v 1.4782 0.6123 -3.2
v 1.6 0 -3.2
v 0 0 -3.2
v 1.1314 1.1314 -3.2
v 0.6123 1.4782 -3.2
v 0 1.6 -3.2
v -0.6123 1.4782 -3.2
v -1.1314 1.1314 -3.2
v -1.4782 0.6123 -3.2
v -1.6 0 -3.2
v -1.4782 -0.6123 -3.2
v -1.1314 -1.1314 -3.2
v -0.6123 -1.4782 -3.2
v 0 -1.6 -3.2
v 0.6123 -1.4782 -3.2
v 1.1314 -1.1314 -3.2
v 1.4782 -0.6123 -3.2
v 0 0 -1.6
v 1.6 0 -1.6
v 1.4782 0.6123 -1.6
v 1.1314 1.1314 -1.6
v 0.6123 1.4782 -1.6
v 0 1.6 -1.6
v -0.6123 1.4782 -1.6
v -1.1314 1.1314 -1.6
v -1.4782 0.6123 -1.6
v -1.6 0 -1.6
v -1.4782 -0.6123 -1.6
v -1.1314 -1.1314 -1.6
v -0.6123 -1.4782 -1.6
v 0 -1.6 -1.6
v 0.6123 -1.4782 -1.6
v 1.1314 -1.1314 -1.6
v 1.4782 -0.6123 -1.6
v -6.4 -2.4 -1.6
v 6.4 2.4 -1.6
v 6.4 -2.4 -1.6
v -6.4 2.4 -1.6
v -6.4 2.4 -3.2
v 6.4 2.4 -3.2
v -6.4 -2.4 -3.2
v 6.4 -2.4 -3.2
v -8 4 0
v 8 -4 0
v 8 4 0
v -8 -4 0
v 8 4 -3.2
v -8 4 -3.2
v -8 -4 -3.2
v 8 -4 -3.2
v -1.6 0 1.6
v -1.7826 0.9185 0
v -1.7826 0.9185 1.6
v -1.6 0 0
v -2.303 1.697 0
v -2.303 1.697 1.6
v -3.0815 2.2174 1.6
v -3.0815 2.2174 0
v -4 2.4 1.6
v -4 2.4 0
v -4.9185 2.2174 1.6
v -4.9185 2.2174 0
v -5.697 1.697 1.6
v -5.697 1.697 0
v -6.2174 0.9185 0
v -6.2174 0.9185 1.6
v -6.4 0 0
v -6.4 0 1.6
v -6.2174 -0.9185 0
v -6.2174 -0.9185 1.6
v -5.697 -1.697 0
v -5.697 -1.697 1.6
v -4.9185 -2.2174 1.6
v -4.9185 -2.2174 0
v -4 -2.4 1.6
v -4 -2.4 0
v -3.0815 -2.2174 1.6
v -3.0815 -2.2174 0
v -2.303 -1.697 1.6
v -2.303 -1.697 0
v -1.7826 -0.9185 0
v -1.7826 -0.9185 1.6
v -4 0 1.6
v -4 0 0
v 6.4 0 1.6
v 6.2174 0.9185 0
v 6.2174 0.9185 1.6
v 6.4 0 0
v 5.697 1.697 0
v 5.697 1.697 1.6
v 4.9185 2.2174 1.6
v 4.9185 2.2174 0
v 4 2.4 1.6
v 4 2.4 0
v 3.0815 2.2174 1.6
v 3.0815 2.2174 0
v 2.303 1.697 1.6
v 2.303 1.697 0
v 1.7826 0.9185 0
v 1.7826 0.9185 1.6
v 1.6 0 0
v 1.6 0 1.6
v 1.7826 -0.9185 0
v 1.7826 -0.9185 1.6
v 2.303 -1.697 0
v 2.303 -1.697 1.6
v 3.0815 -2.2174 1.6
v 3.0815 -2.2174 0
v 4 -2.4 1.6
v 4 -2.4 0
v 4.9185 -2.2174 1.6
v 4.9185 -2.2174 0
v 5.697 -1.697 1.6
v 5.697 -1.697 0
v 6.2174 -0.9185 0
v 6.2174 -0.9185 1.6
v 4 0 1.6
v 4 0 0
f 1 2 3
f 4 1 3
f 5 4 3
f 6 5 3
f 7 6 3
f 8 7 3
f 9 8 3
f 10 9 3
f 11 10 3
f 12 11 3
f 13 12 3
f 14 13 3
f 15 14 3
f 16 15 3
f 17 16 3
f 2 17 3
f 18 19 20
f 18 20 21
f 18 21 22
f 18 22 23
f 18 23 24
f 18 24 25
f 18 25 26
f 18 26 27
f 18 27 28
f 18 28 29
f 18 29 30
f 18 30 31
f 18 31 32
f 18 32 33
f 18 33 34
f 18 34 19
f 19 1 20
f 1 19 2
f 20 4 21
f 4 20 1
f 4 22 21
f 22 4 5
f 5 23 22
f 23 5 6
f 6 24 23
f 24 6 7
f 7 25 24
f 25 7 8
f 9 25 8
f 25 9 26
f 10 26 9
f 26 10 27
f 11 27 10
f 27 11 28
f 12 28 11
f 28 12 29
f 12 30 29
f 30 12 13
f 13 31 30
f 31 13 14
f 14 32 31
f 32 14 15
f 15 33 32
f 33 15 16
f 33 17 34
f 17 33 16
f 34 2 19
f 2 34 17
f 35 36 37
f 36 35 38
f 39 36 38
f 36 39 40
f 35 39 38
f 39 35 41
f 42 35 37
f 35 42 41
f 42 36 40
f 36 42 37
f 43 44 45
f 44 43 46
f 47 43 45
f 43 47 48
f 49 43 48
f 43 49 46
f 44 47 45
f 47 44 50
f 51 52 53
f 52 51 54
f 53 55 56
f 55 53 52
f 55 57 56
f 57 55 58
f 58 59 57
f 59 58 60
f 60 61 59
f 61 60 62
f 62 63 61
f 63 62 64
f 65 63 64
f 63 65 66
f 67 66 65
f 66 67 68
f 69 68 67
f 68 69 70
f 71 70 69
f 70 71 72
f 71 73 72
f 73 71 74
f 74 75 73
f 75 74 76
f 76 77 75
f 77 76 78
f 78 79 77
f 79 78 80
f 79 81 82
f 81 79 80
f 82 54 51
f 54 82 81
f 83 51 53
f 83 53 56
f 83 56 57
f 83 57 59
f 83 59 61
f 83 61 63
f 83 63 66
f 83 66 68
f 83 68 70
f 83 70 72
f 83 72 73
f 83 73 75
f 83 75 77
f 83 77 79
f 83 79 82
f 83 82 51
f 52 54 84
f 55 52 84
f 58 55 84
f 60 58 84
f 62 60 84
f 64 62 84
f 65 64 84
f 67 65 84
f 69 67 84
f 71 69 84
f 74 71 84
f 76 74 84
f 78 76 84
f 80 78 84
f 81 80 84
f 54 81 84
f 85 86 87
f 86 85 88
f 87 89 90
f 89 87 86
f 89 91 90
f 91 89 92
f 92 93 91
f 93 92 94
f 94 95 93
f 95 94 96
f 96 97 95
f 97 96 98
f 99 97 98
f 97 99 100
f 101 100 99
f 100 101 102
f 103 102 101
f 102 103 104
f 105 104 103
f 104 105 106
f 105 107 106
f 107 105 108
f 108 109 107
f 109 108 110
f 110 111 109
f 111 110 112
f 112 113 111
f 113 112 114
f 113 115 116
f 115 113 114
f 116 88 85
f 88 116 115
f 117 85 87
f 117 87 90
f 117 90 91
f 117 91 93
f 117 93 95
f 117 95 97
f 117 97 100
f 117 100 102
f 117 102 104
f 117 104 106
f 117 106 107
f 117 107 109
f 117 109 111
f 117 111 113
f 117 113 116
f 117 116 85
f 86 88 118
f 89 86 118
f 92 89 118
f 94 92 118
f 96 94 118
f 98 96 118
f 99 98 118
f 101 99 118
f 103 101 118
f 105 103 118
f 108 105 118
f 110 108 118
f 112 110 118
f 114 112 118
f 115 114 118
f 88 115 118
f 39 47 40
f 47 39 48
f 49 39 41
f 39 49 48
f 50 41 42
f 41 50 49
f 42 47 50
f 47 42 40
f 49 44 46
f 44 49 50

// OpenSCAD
// file: ../p/stud.scad
use <../lib.scad>
use <4-4cyli.scad>
use <4-4disc.scad>
use <4-4edge.scad>
function ldraw_lib__stud() = [
// 0 Stud
// 0 Name: stud.dat
// 0 Author: James Jessiman
// 0 !LDRAW_ORG Primitive UPDATE 2012-01
// 0 !LICENSE Licensed under CC BY 4.0 : see CAreadme.txt
// 
// 0 BFC CERTIFY CCW
  [0,"BFC","CERTIFY"],
  [0,"BFC","CCW"],
// 
// 0 !HISTORY 2002-04-04 [sbliss] Modified for BFC compliance
// 0 !HISTORY 2002-04-25 [PTadmin] Official Update 2002-02
// 0 !HISTORY 2007-06-24 [PTadmin] Header formatted for Contributor Agreement
// 0 !HISTORY 2008-07-01 [PTadmin] Official Update 2008-01
// 0 !HISTORY 2012-02-16 [Philo] Changed to CCW
// 0 !HISTORY 2012-03-30 [PTadmin] Official Update 2012-01
// 
// 
// 1 16 0 0 0 6 0 0 0 1 0 0 0 6 4-4edge.dat
  [1,16,0,0,0,6,0,0,0,1,0,0,0,6, ldraw_lib__4_4edge()],
// 1 16 0 -4 0 6 0 0 0 1 0 0 0 6 4-4edge.dat
  [1,16,0,-4,0,6,0,0,0,1,0,0,0,6, ldraw_lib__4_4edge()],
// 1 16 0 0 0 6 0 0 0 -4 0 0 0 6 4-4cyli.dat
  [1,16,0,0,0,6,0,0,0,-4,0,0,0,6, ldraw_lib__4_4cyli()],
// 1 16 0 -4 0 6 0 0 0 1 0 0 0 6 4-4disc.dat
  [1,16,0,-4,0,6,0,0,0,1,0,0,0,6, ldraw_lib__4_4disc()],
  [-1,16,0,0,0,6,0,0,0,-1,0,0,0,6, ldraw_lib__4_4disc()],
];
module ldraw_lib__stud(step=0, col=false, unit=2/5, alt=false, line=0.2, solid=!$preview)
    makepoly(ldraw_lib__stud(), step=step, col=col, unit=unit, alt=alt, line=line, solid=solid);
ldraw_lib__stud(line=0.2);
// file: ../p/4-4edge.scad
use <../lib.scad>
function ldraw_lib__4_4edge() = [
// 0 Circle 1.0
// 0 Name: 4-4edge.dat
// 0 Author: James Jessiman
// 0 !LDRAW_ORG Primitive UPDATE 2017-01
// 0 !LICENSE Licensed under CC BY 2.0 and CC BY 4.0 : see CAreadme.txt
// 
// 0 BFC CERTIFY CCW
  [0,"BFC","CERTIFY"],
  [0,"BFC","CCW"],
// 
// 0 !HISTORY 1998-12-15 [PTadmin] Official Update 1998-10
// 0 !HISTORY 2005-12-28 [PTadmin] Official Update 2005-01
// 0 !HISTORY 2007-06-24 [PTadmin] Header formatted for Contributor Agreement
// 0 !HISTORY 2008-07-01 [PTadmin] Official Update 2008-01
// 0 !HISTORY 2017-01-15 [Steffen] BFCed
// 0 !HISTORY 2017-12-30 [PTadmin] Official Update 2017-01
// 
// 
// 2 24 1 0 0 0.9239 0 0.3827
  [2,24,1,0,0,0.9239,0,0.3827],
// 2 24 0.9239 0 0.3827 0.7071 0 0.7071
  [2,24,0.9239,0,0.3827,0.7071,0,0.7071],
// 2 24 0.7071 0 0.7071 0.3827 0 0.9239
  [2,24,0.7071,0,0.7071,0.3827,0,0.9239],
// 2 24 0.3827 0 0.9239 0 0 1
  [2,24,0.3827,0,0.9239,0,0,1],
// 2 24 0 0 1 -0.3827 0 0.9239
  [2,24,0,0,1,-0.3827,0,0.9239],
// 2 24 -0.3827 0 0.9239 -0.7071 0 0.7071
  [2,24,-0.3827,0,0.9239,-0.7071,0,0.7071],
// 2 24 -0.7071 0 0.7071 -0.9239 0 0.3827
  [2,24,-0.7071,0,0.7071,-0.9239,0,0.3827],
// 2 24 -0.9239 0 0.3827 -1 0 -0
  [2,24,-0.9239,0,0.3827,-1,0,-0],
// 2 24 -1 0 -0 -0.9239 0 -0.3827
  [2,24,-1,0,-0,-0.9239,0,-0.3827],
// 2 24 -0.9239 0 -0.3827 -0.7071 0 -0.7071
  [2,24,-0.9239,0,-0.3827,-0.7071,0,-0.7071],
// 2 24 -0.7071 0 -0.7071 -0.3827 0 -0.9239
  [2,24,-0.7071,0,-0.7071,-0.3827,0,-0.9239],
// 2 24 -0.3827 0 -0.9239 0 0 -1
  [2,24,-0.3827,0,-0.9239,0,0,-1],
// 2 24 0 0 -1 0.3827 0 -0.9239
  [2,24,0,0,-1,0.3827,0,-0.9239],
// 2 24 0.3827 0 -0.9239 0.7071 0 -0.7071
  [2,24,0.3827,0,-0.9239,0.7071,0,-0.7071],
// 2 24 0.7071 0 -0.7071 0.9239 0 -0.3827
  [2,24,0.7071,0,-0.7071,0.9239,0,-0.3827],
// 2 24 0.9239 0 -0.3827 1 0 0
  [2,24,0.9239,0,-0.3827,1,0,0],
];
module ldraw_lib__4_4edge(step=0, col=false, unit=2/5, alt=false, line=0.2, solid=!$preview)
    makepoly(ldraw_lib__4_4edge(), step=step, col=col, unit=unit, alt=alt, line=line, solid=solid);
ldraw_lib__4_4edge(line=0.2);
// file: ../p/4-4disc.scad
use <../lib.scad>
function ldraw_lib__4_4disc() = [
// 0 Disc 1.0
// 0 Name: 4-4disc.dat
// 0 Author: James Jessiman
// 0 !LDRAW_ORG Primitive UPDATE 2002-02
// 0 !LICENSE Licensed under CC BY 2.0 and CC BY 4.0 : see CAreadme.txt
// 
// 0 BFC CERTIFY CCW
  [0,"BFC","CERTIFY"],
  [0,"BFC","CCW"],
// 
// 0 !HISTORY 1998-12-15 [PTadmin] Official Update 1998-10
// 0 !HISTORY 2002-03-23 [sbliss] Added BFC statement
// 0 !HISTORY 2002-04-25 [PTadmin] Official Update 2002-02
// 0 !HISTORY 2007-06-24 [PTadmin] Header formatted for Contributor Agreement
// 0 !HISTORY 2008-07-01 [PTadmin] Official Update 2008-01
// 
// 
// 3 16 0 0 0 1 0 0 0.9239 0 0.3827
  [3,16,0,0,0,1,0,0,0.9239,0,0.3827],
// 3 16 0 0 0 0.9239 0 0.3827 0.7071 0 0.7071
  [3,16,0,0,0,0.9239,0,0.3827,0.7071,0,0.7071],
// 3 16 0 0 0 0.7071 0 0.7071 0.3827 0 0.9239
  [3,16,0,0,0,0.7071,0,0.7071,0.3827,0,0.9239],
// 3 16 0 0 0 0.3827 0 0.9239 0 0 1
  [3,16,0,0,0,0.3827,0,0.9239,0,0,1],
// 3 16 0 0 0 0 0 1 -0.3827 0 0.9239
  [3,16,0,0,0,0,0,1,-0.3827,0,0.9239],
// 3 16 0 0 0 -0.3827 0 0.9239 -0.7071 0 0.7071
  [3,16,0,0,0,-0.3827,0,0.9239,-0.7071,0,0.7071],
// 3 16 0 0 0 -0.7071 0 0.7071 -0.9239 0 0.3827
  [3,16,0,0,0,-0.7071,0,0.7071,-0.9239,0,0.3827],
// 3 16 0 0 0 -0.9239 0 0.3827 -1 0 -0
  [3,16,0,0,0,-0.9239,0,0.3827,-1,0,-0],
// 3 16 0 0 0 -1 0 -0 -0.9239 0 -0.3827
  [3,16,0,0,0,-1,0,-0,-0.9239,0,-0.3827],
// 3 16 0 0 0 -0.9239 0 -0.3827 -0.7071 0 -0.7071
  [3,16,0,0,0,-0.9239,0,-0.3827,-0.7071,0,-0.7071],
// 3 16 0 0 0 -0.7071 0 -0.7071 -0.3827 0 -0.9239
  [3,16,0,0,0,-0.7071,0,-0.7071,-0.3827,0,-0.9239],
// 3 16 0 0 0 -0.3827 0 -0.9239 0 0 -1
  [3,16,0,0,0,-0.3827,0,-0.9239,0,0,-1],
// 3 16 0 0 0 0 0 -1 0.3827 0 -0.9239
  [3,16,0,0,0,0,0,-1,0.3827,0,-0.9239],
// 3 16 0 0 0 0.3827 0 -0.9239 0.7071 0 -0.7071
  [3,16,0,0,0,0.3827,0,-0.9239,0.7071,0,-0.7071],
// 3 16 0 0 0 0.7071 0 -0.7071 0.9239 0 -0.3827
  [3,16,0,0,0,0.7071,0,-0.7071,0.9239,0,-0.3827],
// 3 16 0 0 0 0.9239 0 -0.3827 1 0 0
  [3,16,0,0,0,0.9239,0,-0.3827,1,0,0],
// 0
];
module ldraw_lib__4_4disc(step=0, col=false, unit=2/5, alt=false, line=0.2, solid=!$preview)
    makepoly(ldraw_lib__4_4disc(), step=step, col=col, unit=unit, alt=alt, line=line, solid=solid);
ldraw_lib__4_4disc(line=0.2);
// file: ../p/4-4cyli.scad
use <../lib.scad>
$fa=1; $fs=0.2;
function ldraw_lib__4_4cyli(realsolid=false) = [
// 0 Cylinder 1.0
// 0 Name: 4-4cyli.dat
// 0 Author: James Jessiman
// 0 !LDRAW_ORG Primitive UPDATE 2005-01
// 0 !LICENSE Licensed under CC BY 2.0 and CC BY 4.0 : see CAreadme.txt
// 
// 0 BFC CERTIFY CCW
  [0,"BFC","CERTIFY"],
  [0,"BFC","CCW"],
// 
// 0 !HISTORY 1998-12-15 [PTadmin] Official Update 1998-10
// 0 !HISTORY 2002-03-23 [sbliss] Added BFC statement; merged headers from files in distributions LDraw 0.27 and Complete.
// 0 !HISTORY 2002-04-25 [PTadmin] Official Update 2002-02
// 0 !HISTORY 2004-12-14 [guyvivan] BFC CCW
// 0 !HISTORY 2005-12-28 [PTadmin] Official Update 2005-01
// 0 !HISTORY 2007-06-24 [PTadmin] Header formatted for Contributor Agreement
// 0 !HISTORY 2008-07-01 [PTadmin] Official Update 2008-01
// 
// 
// 4 16 1 1 0 0.9239 1 0.3827 0.9239 0 0.3827 1 0 0
  [4,16,1,1,0,0.9239,1,0.3827,0.9239,0,0.3827,1,0,0],
// 5 24 1 0 0 1 1 0 0.9239 0 0.3827 0.9239 0 -0.3827
  [5,24,1,0,0,1,1,0,0.9239,0,0.3827,0.9239,0,-0.3827],
// 4 16 0.9239 1 0.3827 0.7071 1 0.7071 0.7071 0 0.7071 0.9239 0 0.3827
  [4,16,0.9239,1,0.3827,0.7071,1,0.7071,0.7071,0,0.7071,0.9239,0,0.3827],
// 5 24 0.9239 0 0.3827 0.9239 1 0.3827 0.7071 0 0.7071 1 0 0
  [5,24,0.9239,0,0.3827,0.9239,1,0.3827,0.7071,0,0.7071,1,0,0],
// 4 16 0.7071 1 0.7071 0.3827 1 0.9239 0.3827 0 0.9239 0.7071 0 0.7071
  [4,16,0.7071,1,0.7071,0.3827,1,0.9239,0.3827,0,0.9239,0.7071,0,0.7071],
// 5 24 0.7071 0 0.7071 0.7071 1 0.7071 0.3827 0 0.9239 0.9239 0 0.3827
  [5,24,0.7071,0,0.7071,0.7071,1,0.7071,0.3827,0,0.9239,0.9239,0,0.3827],
// 4 16 0.3827 1 0.9239 0 1 1 0 0 1 0.3827 0 0.9239
  [4,16,0.3827,1,0.9239,0,1,1,0,0,1,0.3827,0,0.9239],
// 5 24 0.3827 0 0.9239 0.3827 1 0.9239 0 0 1 0.7071 0 0.7071
  [5,24,0.3827,0,0.9239,0.3827,1,0.9239,0,0,1,0.7071,0,0.7071],
// 4 16 0 1 1 -0.3827 1 0.9239 -0.3827 0 0.9239 0 0 1
  [4,16,0,1,1,-0.3827,1,0.9239,-0.3827,0,0.9239,0,0,1],
// 5 24 0 0 1 0 1 1 -0.3827 0 0.9239 0.3827 0 0.9239
  [5,24,0,0,1,0,1,1,-0.3827,0,0.9239,0.3827,0,0.9239],
// 4 16 -0.3827 1 0.9239 -0.7071 1 0.7071 -0.7071 0 0.7071 -0.3827 0 0.9239
  [4,16,-0.3827,1,0.9239,-0.7071,1,0.7071,-0.7071,0,0.7071,-0.3827,0,0.9239],
// 5 24 -0.3827 0 0.9239 -0.3827 1 0.9239 -0.7071 0 0.7071 0 0 1
  [5,24,-0.3827,0,0.9239,-0.3827,1,0.9239,-0.7071,0,0.7071,0,0,1],
// 4 16 -0.7071 1 0.7071 -0.9239 1 0.3827 -0.9239 0 0.3827 -0.7071 0 0.7071
  [4,16,-0.7071,1,0.7071,-0.9239,1,0.3827,-0.9239,0,0.3827,-0.7071,0,0.7071],
// 5 24 -0.7071 0 0.7071 -0.7071 1 0.7071 -0.9239 0 0.3827 -0.3827 0 0.9239
  [5,24,-0.7071,0,0.7071,-0.7071,1,0.7071,-0.9239,0,0.3827,-0.3827,0,0.9239],
// 4 16 -0.9239 1 0.3827 -1 1 0 -1 0 0 -0.9239 0 0.3827
  [4,16,-0.9239,1,0.3827,-1,1,0,-1,0,0,-0.9239,0,0.3827],
// 5 24 -0.9239 0 0.3827 -0.9239 1 0.3827 -1 0 0 -0.7071 0 0.7071
  [5,24,-0.9239,0,0.3827,-0.9239,1,0.3827,-1,0,0,-0.7071,0,0.7071],
// 4 16 -1 1 0 -0.9239 1 -0.3827 -0.9239 0 -0.3827 -1 0 0
  [4,16,-1,1,0,-0.9239,1,-0.3827,-0.9239,0,-0.3827,-1,0,0],
// 5 24 -1 0 0 -1 1 0 -0.9239 0 -0.3827 -0.9239 0 0.3827
  [5,24,-1,0,0,-1,1,0,-0.9239,0,-0.3827,-0.9239,0,0.3827],
// 4 16 -0.9239 1 -0.3827 -0.7071 1 -0.7071 -0.7071 0 -0.7071 -0.9239 0 -0.3827
  [4,16,-0.9239,1,-0.3827,-0.7071,1,-0.7071,-0.7071,0,-0.7071,-0.9239,0,-0.3827],
// 5 24 -0.9239 0 -0.3827 -0.9239 1 -0.3827 -0.7071 0 -0.7071 -1 0 0
  [5,24,-0.9239,0,-0.3827,-0.9239,1,-0.3827,-0.7071,0,-0.7071,-1,0,0],
// 4 16 -0.7071 1 -0.7071 -0.3827 1 -0.9239 -0.3827 0 -0.9239 -0.7071 0 -0.7071
  [4,16,-0.7071,1,-0.7071,-0.3827,1,-0.9239,-0.3827,0,-0.9239,-0.7071,0,-0.7071],
// 5 24 -0.7071 0 -0.7071 -0.7071 1 -0.7071 -0.3827 0 -0.9239 -0.9239 0 -0.3827
  [5,24,-0.7071,0,-0.7071,-0.7071,1,-0.7071,-0.3827,0,-0.9239,-0.9239,0,-0.3827],
// 4 16 -0.3827 1 -0.9239 0 1 -1 0 0 -1 -0.3827 0 -0.9239
  [4,16,-0.3827,1,-0.9239,0,1,-1,0,0,-1,-0.3827,0,-0.9239],
// 5 24 -0.3827 0 -0.9239 -0.3827 1 -0.9239 0 0 -1 -0.7071 0 -0.7071
  [5,24,-0.3827,0,-0.9239,-0.3827,1,-0.9239,0,0,-1,-0.7071,0,-0.7071],
// 4 16 0 1 -1 0.3827 1 -0.9239 0.3827 0 -0.9239 0 0 -1
  [4,16,0,1,-1,0.3827,1,-0.9239,0.3827,0,-0.9239,0,0,-1],
// 5 24 0 0 -1 0 1 -1 0.3827 0 -0.9239 -0.3827 0 -0.9239
  [5,24,0,0,-1,0,1,-1,0.3827,0,-0.9239,-0.3827,0,-0.9239],
// 4 16 0.3827 1 -0.9239 0.7071 1 -0.7071 0.7071 0 -0.7071 0.3827 0 -0.9239
  [4,16,0.3827,1,-0.9239,0.7071,1,-0.7071,0.7071,0,-0.7071,0.3827,0,-0.9239],
// 5 24 0.3827 0 -0.9239 0.3827 1 -0.9239 0.7071 0 -0.7071 0 0 -1
  [5,24,0.3827,0,-0.9239,0.3827,1,-0.9239,0.7071,0,-0.7071,0,0,-1],
// 4 16 0.7071 1 -0.7071 0.9239 1 -0.3827 0.9239 0 -0.3827 0.7071 0 -0.7071
  [4,16,0.7071,1,-0.7071,0.9239,1,-0.3827,0.9239,0,-0.3827,0.7071,0,-0.7071],
// 5 24 0.7071 0 -0.7071 0.7071 1 -0.7071 0.9239 0 -0.3827 0.3827 0 -0.9239
  [5,24,0.7071,0,-0.7071,0.7071,1,-0.7071,0.9239,0,-0.3827,0.3827,0,-0.9239],
// 4 16 0.9239 1 -0.3827 1 1 0 1 0 0 0.9239 0 -0.3827
  [4,16,0.9239,1,-0.3827,1,1,0,1,0,0,0.9239,0,-0.3827],
// 5 24 0.9239 0 -0.3827 0.9239 1 -0.3827 1 0 0 0.7071 0 -0.7071
  [5,24,0.9239,0,-0.3827,0.9239,1,-0.3827,1,0,0,0.7071,0,-0.7071],
// 0
];
module ldraw_lib__4_4cyli(step=0, col=false, unit=2/5, alt=false, line=0.2, solid=!$preview)
    makepoly(ldraw_lib__4_4cyli(solid), step=step, col=col, unit=unit, alt=alt, line=line, solid=solid);
ldraw_lib__4_4cyli(line=0.2);
// file: ../p/stug-1x2.scad
use <../lib.scad>
use <stud.scad>
$fa=1; $fs=0.2;
function ldraw_lib__stug_1x2(realsolid=false) = [
// 0 Stud Group  1 x  2
// 0 Name: stug-1x2.dat
// 0 Author: Steffen [Steffen]
// 0 !LDRAW_ORG Primitive UPDATE 2011-01
// 0 !LICENSE Licensed under CC BY 2.0 and CC BY 4.0 : see CAreadme.txt
// 
// 0 BFC CERTIFY CCW
  [0,"BFC","CERTIFY"],
  [0,"BFC","CCW"],
// 
// 0 !HISTORY 2011-07-25 [PTadmin] Official Update 2011-01
// 
// 
// 1 16 -10 0 0 1 0 0 0 1 0 0 0 1 stud.dat
  [1,16,-10,0,0,1,0,0,0,1,0,0,0,1, ldraw_lib__stud(realsolid)],
// 1 16 10 0 0 1 0 0 0 1 0 0 0 1 stud.dat
  [1,16,10,0,0,1,0,0,0,1,0,0,0,1, ldraw_lib__stud(realsolid)],
];
module ldraw_lib__stug_1x2(step=0, col=false, unit=2/5, alt=false, line=0.2, solid=!$preview)
    makepoly(ldraw_lib__stug_1x2(solid), step=step, col=col, unit=unit, alt=alt, line=line, solid=solid);
ldraw_lib__stug_1x2(line=0.2);
// file: ../p/stud3.scad
use <../lib.scad>
use <4-4cyli.scad>
use <4-4disc.scad>
use <4-4edge.scad>
function ldraw_lib__stud3() = [
// 0 Stud Tube Solid
// 0 Name: stud3.dat
// 0 Author: James Jessiman
// 0 !LDRAW_ORG Primitive UPDATE 2012-01
// 0 !LICENSE Licensed under CC BY 4.0 : see CAreadme.txt
// 
// 0 BFC CERTIFY CCW
  [0,"BFC","CERTIFY"],
  [0,"BFC","CCW"],
// 
// 0 !HISTORY 2002-04-04 [sbliss] Modified for BFC compliance
// 0 !HISTORY 2002-04-25 [PTadmin] Official Update 2002-02
// 0 !HISTORY 2007-06-24 [PTadmin] Header formatted for Contributor Agreement
// 0 !HISTORY 2008-07-01 [PTadmin] Official Update 2008-01
// 0 !HISTORY 2012-02-16 [Philo] Changed to CCW
// 0 !HISTORY 2012-03-30 [PTadmin] Official Update 2012-01
// 
// 
// 1 16 0 -4 0 4 0 0 0 1 0 0 0 4 4-4edge.dat
  [1,16,0,-4,0,4,0,0,0,1,0,0,0,4, ldraw_lib__4_4edge()],
// 1 16 0 0 0 4 0 0 0 1 0 0 0 4 4-4edge.dat
  [1,16,0,0,0,4,0,0,0,1,0,0,0,4, ldraw_lib__4_4edge()],
// 1 16 0 -4 0 4 0 0 0 1 0 0 0 4 4-4disc.dat
  [1,16,0,-4,0,4,0,0,0,1,0,0,0,4, ldraw_lib__4_4disc()],
  [-1,16,0,0,0,4,0,0,0,-1,0,0,0,4, ldraw_lib__4_4disc()],
// 1 16 0 -4 0 4 0 0 0 4 0 0 0 4 4-4cyli.dat
  [1,16,0,-4,0,4,0,0,0,4,0,0,0,4, ldraw_lib__4_4cyli()],
];
module ldraw_lib__stud3(step=0, col=false, unit=2/5, alt=false, line=0.2, solid=!$preview)
    makepoly(ldraw_lib__stud3(), step=step, col=col, unit=unit, alt=alt, line=line, solid=solid);
ldraw_lib__stud3(line=0.2);
// file: ../p/box5.scad
use <../lib.scad>
function ldraw_lib__box5() = [
// 0 Box with 5 Faces and All Edges
// 0 Name: box5.dat
// 0 Author: James Jessiman
// 0 !LDRAW_ORG Primitive UPDATE 2012-01
// 0 !LICENSE Licensed under CC BY 2.0 and CC BY 4.0 : see CAreadme.txt
// 
// 0 BFC CERTIFY CCW
  [0,"BFC","CERTIFY"],
  [0,"BFC","CCW"],
// 
// 0 !HISTORY 2002-04-03 [sbliss] Modified for BFC compliance
// 0 !HISTORY 2002-04-25 [PTadmin] Official Update 2002-02
// 0 !HISTORY 2007-06-24 [PTadmin] Header formatted for Contributor Agreement
// 0 !HISTORY 2008-07-01 [PTadmin] Official Update 2008-01
// 0 !HISTORY 2012-02-16 [Philo] Changed to CCW
// 0 !HISTORY 2012-03-30 [PTadmin] Official Update 2012-01
// 
// 
// 2 24 1 1 1 -1 1 1
  [2,24,1,1,1,-1,1,1],
// 2 24 -1 1 1 -1 1 -1
  [2,24,-1,1,1,-1,1,-1],
// 2 24 -1 1 -1 1 1 -1
  [2,24,-1,1,-1,1,1,-1],
// 2 24 1 1 -1 1 1 1
  [2,24,1,1,-1,1,1,1],
// 2 24 1 0 1 -1 0 1
  [2,24,1,0,1,-1,0,1],
// 2 24 -1 0 1 -1 0 -1
  [2,24,-1,0,1,-1,0,-1],
// 2 24 -1 0 -1 1 0 -1
  [2,24,-1,0,-1,1,0,-1],
// 2 24 1 0 -1 1 0 1
  [2,24,1,0,-1,1,0,1],
// 2 24 1 0 1 1 1 1
  [2,24,1,0,1,1,1,1],
// 2 24 -1 0 1 -1 1 1
  [2,24,-1,0,1,-1,1,1],
// 2 24 1 0 -1 1 1 -1
  [2,24,1,0,-1,1,1,-1],
// 2 24 -1 0 -1 -1 1 -1
  [2,24,-1,0,-1,-1,1,-1],
// 4 16 -1 1 1 1 1 1 1 1 -1 -1 1 -1
  [4,16,-1,1,1,1,1,1,1,1,-1,-1,1,-1],
// 4 16 -1 1 1 -1 0 1 1 0 1 1 1 1
  [4,16,-1,1,1,-1,0,1,1,0,1,1,1,1],
// 4 16 -1 1 -1 -1 0 -1 -1 0 1 -1 1 1
  [4,16,-1,1,-1,-1,0,-1,-1,0,1,-1,1,1],
// 4 16 1 1 -1 1 0 -1 -1 0 -1 -1 1 -1
  [4,16,1,1,-1,1,0,-1,-1,0,-1,-1,1,-1],
// 4 16 1 1 1 1 0 1 1 0 -1 1 1 -1
  [4,16,1,1,1,1,0,1,1,0,-1,1,1,-1],
];
makepoly(ldraw_lib__box5(), line=0.2);
// file: ../p/box4t.scad
use <../lib.scad>
function ldraw_lib__box4t() = [
// 0 Box with 4 Adjacent Faces and All Edges
// 0 Name: box4t.dat
// 0 Author: Tore Eriksson [Tore_Eriksson]
// 0 !LDRAW_ORG Primitive UPDATE 2003-02
// 0 !LICENSE Licensed under CC BY 2.0 and CC BY 4.0 : see CAreadme.txt
// 
// 0 BFC CERTIFY CCW
  [0,"BFC","CERTIFY"],
  [0,"BFC","CCW"],
// 
// 0 !HISTORY 1997-09-29 [PTadmin] Official Update 1997-15
// 0 !HISTORY 2002-08-31 [izanette] Modified with WINDZ for BFC compliance
// 0 !HISTORY 2003-08-01 [PTadmin] Official Update 2003-02
// 0 !HISTORY 2007-06-24 [PTadmin] Header formatted for Contributor Agreement
// 0 !HISTORY 2008-07-01 [PTadmin] Official Update 2008-01
// 
// 
// 2 24 1 1 1 -1 1 1
  [2,24,1,1,1,-1,1,1],
// 2 24 -1 1 1 -1 1 -1
  [2,24,-1,1,1,-1,1,-1],
// 2 24 -1 1 -1 1 1 -1
  [2,24,-1,1,-1,1,1,-1],
// 2 24 1 1 -1 1 1 1
  [2,24,1,1,-1,1,1,1],
// 2 24 1 0 1 -1 0 1
  [2,24,1,0,1,-1,0,1],
// 2 24 -1 0 1 -1 0 -1
  [2,24,-1,0,1,-1,0,-1],
// 2 24 -1 0 -1 1 0 -1
  [2,24,-1,0,-1,1,0,-1],
// 2 24 1 0 -1 1 0 1
  [2,24,1,0,-1,1,0,1],
// 2 24 1 0 1 1 1 1
  [2,24,1,0,1,1,1,1],
// 2 24 -1 0 1 -1 1 1
  [2,24,-1,0,1,-1,1,1],
// 2 24 1 0 -1 1 1 -1
  [2,24,1,0,-1,1,1,-1],
// 2 24 -1 0 -1 -1 1 -1
  [2,24,-1,0,-1,-1,1,-1],
// 4 16 1 1 1 1 1 -1 -1 1 -1 -1 1 1
  [4,16,1,1,1,1,1,-1,-1,1,-1,-1,1,1],
// 4 16 1 1 1 -1 1 1 -1 0 1 1 0 1
  [4,16,1,1,1,-1,1,1,-1,0,1,1,0,1],
// 4 16 -1 1 1 -1 1 -1 -1 0 -1 -1 0 1
  [4,16,-1,1,1,-1,1,-1,-1,0,-1,-1,0,1],
// 0 4 16 -1 1 -1 -1 0 -1 1 0 -1 1 1 -1
// 4 16 1 1 -1 1 1 1 1 0 1 1 0 -1
  [4,16,1,1,-1,1,1,1,1,0,1,1,0,-1],
// 0
];
makepoly(ldraw_lib__box4t(), line=0.2);
// file: s/3023bs01.scad
use <../../lib.scad>
use <../../p/box4t.scad>
use <../../p/box5.scad>
use <../../p/stud3.scad>
use <../../p/stug-1x2.scad>
function ldraw_lib__s__3023bs01() = [
// 0 ~Plate  1 x  2 without Front Face
// 0 Name: s\3023bs01.dat
// 0 Author: Massimo Maso [Sirio]
// 0 !LDRAW_ORG Subpart UPDATE 2023-03
// 0 !LICENSE Licensed under CC BY 4.0 : see CAreadme.txt
// 
// 0 BFC CERTIFY CCW
  [0,"BFC","CERTIFY"],
  [0,"BFC","CCW"],
// 
// 0 !HISTORY 2022-01-14 [PTadmin] Official Update 2022-01
// 0 !HISTORY 2023-05-27 [OrionP] Moved from s\3023s01.dat
// 0 !HISTORY 2023-06-24 [OrionP] Official Update 2023-03
// 
// 
// 0 // Primitves
// 1 16 0 4 0 1 0 0 0 -1 0 0 0 1 stud3.dat
  [1,16,0,4,0,1,0,0,0,-1,0,0,0,1, ldraw_lib__stud3()],
// 0 BFC INVERTNEXT
  [0,"BFC","INVERTNEXT"],
// 1 16 0 8 0 16 0 0 0 -4 0 0 0 6 box5.dat
  [1,16,0,8,0,16,0,0,0,-4,0,0,0,6, ldraw_lib__box5()],
// 1 16 0 8 0 20 0 0 0 -8 0 0 0 10 box4t.dat
  [1,16,0,8,0,20,0,0,0,-8,0,0,0,10, ldraw_lib__box4t()],
// 1 16 0 0 0 1 0 0 0 1 0 0 0 1 stug-1x2.dat
  [1,16,0,0,0,1,0,0,0,1,0,0,0,1, ldraw_lib__stug_1x2()],
// 0 // Faces
// 4 16 20 8 10 16 8 6 -16 8 6 -20 8 10
  [4,16,20,8,10,16,8,6,-16,8,6,-20,8,10],
// 4 16 -20 8 10 -16 8 6 -16 8 -6 -20 8 -10
  [4,16,-20,8,10,-16,8,6,-16,8,-6,-20,8,-10],
// 4 16 -20 8 -10 -16 8 -6 16 8 -6 20 8 -10
  [4,16,-20,8,-10,-16,8,-6,16,8,-6,20,8,-10],
// 4 16 20 8 -10 16 8 -6 16 8 6 20 8 10
  [4,16,20,8,-10,16,8,-6,16,8,6,20,8,10],
];
module ldraw_lib__s__3023bs01(step=0, col=false, unit=2/5, alt=false, line=0.2, solid=!$preview)
    makepoly(ldraw_lib__s__3023bs01(), step=step, col=col, unit=unit, alt=alt, line=line, solid=solid);
ldraw_lib__s__3023bs01(line=0.2);
// main file
use <../lib.scad>
use <s/3023bs01.scad>
function ldraw_lib__3023bpb0() = [
// 0 Plate  1 x  2 with Metallic Gold Front Face Pattern
// 0 Name: 3023bpb0.dat
// 0 Author: Massimo Maso [Sirio]
// 0 !LDRAW_ORG Part UPDATE 2023-04
// 0 !LICENSE Licensed under CC BY 4.0 : see CAreadme.txt
// 
// 0 BFC CERTIFY CCW
  [0,"BFC","CERTIFY"],
  [0,"BFC","CCW"],
// 
// 0 !KEYWORDS Bricklink 3023pb02, Iron Man, Marvel, Rebrickable 3023pr0001
// 0 !KEYWORDS Set 76165, Superheroes
// 
// 0 !HISTORY 2022-01-14 [PTadmin] Official Update 2022-01
// 0 !HISTORY 2023-05-27 [OrionP] Moved from 3023pb0.dat
// 0 !HISTORY 2023-05-28 [MagFors] Corrected colour
// 0 !HISTORY 2023-08-25 [OrionP] Official Update 2023-04
// 
// 
// 0 // Subparts
// 1 16 0 0 0 1 0 0 0 1 0 0 0 1 s\3023bs01.dat
  [1,16,0,0,0,1,0,0,0,1,0,0,0,1, ldraw_lib__s__3023bs01()],
// 0 // Patterned face
// 4 82 -20 0 -10 -20 8 -10 20 8 -10 20 0 -10
  [4,82,-20,0,-10,-20,8,-10,20,8,-10,20,0,-10],
];
module ldraw_lib__3023bpb0(step=0, col=false, unit=2/5, alt=false, line=0.2, solid=!$preview)
    makepoly(ldraw_lib__3023bpb0(), step=step, col=col, unit=unit, alt=alt, line=line, solid=solid);
ldraw_lib__3023bpb0(line=0.2);
